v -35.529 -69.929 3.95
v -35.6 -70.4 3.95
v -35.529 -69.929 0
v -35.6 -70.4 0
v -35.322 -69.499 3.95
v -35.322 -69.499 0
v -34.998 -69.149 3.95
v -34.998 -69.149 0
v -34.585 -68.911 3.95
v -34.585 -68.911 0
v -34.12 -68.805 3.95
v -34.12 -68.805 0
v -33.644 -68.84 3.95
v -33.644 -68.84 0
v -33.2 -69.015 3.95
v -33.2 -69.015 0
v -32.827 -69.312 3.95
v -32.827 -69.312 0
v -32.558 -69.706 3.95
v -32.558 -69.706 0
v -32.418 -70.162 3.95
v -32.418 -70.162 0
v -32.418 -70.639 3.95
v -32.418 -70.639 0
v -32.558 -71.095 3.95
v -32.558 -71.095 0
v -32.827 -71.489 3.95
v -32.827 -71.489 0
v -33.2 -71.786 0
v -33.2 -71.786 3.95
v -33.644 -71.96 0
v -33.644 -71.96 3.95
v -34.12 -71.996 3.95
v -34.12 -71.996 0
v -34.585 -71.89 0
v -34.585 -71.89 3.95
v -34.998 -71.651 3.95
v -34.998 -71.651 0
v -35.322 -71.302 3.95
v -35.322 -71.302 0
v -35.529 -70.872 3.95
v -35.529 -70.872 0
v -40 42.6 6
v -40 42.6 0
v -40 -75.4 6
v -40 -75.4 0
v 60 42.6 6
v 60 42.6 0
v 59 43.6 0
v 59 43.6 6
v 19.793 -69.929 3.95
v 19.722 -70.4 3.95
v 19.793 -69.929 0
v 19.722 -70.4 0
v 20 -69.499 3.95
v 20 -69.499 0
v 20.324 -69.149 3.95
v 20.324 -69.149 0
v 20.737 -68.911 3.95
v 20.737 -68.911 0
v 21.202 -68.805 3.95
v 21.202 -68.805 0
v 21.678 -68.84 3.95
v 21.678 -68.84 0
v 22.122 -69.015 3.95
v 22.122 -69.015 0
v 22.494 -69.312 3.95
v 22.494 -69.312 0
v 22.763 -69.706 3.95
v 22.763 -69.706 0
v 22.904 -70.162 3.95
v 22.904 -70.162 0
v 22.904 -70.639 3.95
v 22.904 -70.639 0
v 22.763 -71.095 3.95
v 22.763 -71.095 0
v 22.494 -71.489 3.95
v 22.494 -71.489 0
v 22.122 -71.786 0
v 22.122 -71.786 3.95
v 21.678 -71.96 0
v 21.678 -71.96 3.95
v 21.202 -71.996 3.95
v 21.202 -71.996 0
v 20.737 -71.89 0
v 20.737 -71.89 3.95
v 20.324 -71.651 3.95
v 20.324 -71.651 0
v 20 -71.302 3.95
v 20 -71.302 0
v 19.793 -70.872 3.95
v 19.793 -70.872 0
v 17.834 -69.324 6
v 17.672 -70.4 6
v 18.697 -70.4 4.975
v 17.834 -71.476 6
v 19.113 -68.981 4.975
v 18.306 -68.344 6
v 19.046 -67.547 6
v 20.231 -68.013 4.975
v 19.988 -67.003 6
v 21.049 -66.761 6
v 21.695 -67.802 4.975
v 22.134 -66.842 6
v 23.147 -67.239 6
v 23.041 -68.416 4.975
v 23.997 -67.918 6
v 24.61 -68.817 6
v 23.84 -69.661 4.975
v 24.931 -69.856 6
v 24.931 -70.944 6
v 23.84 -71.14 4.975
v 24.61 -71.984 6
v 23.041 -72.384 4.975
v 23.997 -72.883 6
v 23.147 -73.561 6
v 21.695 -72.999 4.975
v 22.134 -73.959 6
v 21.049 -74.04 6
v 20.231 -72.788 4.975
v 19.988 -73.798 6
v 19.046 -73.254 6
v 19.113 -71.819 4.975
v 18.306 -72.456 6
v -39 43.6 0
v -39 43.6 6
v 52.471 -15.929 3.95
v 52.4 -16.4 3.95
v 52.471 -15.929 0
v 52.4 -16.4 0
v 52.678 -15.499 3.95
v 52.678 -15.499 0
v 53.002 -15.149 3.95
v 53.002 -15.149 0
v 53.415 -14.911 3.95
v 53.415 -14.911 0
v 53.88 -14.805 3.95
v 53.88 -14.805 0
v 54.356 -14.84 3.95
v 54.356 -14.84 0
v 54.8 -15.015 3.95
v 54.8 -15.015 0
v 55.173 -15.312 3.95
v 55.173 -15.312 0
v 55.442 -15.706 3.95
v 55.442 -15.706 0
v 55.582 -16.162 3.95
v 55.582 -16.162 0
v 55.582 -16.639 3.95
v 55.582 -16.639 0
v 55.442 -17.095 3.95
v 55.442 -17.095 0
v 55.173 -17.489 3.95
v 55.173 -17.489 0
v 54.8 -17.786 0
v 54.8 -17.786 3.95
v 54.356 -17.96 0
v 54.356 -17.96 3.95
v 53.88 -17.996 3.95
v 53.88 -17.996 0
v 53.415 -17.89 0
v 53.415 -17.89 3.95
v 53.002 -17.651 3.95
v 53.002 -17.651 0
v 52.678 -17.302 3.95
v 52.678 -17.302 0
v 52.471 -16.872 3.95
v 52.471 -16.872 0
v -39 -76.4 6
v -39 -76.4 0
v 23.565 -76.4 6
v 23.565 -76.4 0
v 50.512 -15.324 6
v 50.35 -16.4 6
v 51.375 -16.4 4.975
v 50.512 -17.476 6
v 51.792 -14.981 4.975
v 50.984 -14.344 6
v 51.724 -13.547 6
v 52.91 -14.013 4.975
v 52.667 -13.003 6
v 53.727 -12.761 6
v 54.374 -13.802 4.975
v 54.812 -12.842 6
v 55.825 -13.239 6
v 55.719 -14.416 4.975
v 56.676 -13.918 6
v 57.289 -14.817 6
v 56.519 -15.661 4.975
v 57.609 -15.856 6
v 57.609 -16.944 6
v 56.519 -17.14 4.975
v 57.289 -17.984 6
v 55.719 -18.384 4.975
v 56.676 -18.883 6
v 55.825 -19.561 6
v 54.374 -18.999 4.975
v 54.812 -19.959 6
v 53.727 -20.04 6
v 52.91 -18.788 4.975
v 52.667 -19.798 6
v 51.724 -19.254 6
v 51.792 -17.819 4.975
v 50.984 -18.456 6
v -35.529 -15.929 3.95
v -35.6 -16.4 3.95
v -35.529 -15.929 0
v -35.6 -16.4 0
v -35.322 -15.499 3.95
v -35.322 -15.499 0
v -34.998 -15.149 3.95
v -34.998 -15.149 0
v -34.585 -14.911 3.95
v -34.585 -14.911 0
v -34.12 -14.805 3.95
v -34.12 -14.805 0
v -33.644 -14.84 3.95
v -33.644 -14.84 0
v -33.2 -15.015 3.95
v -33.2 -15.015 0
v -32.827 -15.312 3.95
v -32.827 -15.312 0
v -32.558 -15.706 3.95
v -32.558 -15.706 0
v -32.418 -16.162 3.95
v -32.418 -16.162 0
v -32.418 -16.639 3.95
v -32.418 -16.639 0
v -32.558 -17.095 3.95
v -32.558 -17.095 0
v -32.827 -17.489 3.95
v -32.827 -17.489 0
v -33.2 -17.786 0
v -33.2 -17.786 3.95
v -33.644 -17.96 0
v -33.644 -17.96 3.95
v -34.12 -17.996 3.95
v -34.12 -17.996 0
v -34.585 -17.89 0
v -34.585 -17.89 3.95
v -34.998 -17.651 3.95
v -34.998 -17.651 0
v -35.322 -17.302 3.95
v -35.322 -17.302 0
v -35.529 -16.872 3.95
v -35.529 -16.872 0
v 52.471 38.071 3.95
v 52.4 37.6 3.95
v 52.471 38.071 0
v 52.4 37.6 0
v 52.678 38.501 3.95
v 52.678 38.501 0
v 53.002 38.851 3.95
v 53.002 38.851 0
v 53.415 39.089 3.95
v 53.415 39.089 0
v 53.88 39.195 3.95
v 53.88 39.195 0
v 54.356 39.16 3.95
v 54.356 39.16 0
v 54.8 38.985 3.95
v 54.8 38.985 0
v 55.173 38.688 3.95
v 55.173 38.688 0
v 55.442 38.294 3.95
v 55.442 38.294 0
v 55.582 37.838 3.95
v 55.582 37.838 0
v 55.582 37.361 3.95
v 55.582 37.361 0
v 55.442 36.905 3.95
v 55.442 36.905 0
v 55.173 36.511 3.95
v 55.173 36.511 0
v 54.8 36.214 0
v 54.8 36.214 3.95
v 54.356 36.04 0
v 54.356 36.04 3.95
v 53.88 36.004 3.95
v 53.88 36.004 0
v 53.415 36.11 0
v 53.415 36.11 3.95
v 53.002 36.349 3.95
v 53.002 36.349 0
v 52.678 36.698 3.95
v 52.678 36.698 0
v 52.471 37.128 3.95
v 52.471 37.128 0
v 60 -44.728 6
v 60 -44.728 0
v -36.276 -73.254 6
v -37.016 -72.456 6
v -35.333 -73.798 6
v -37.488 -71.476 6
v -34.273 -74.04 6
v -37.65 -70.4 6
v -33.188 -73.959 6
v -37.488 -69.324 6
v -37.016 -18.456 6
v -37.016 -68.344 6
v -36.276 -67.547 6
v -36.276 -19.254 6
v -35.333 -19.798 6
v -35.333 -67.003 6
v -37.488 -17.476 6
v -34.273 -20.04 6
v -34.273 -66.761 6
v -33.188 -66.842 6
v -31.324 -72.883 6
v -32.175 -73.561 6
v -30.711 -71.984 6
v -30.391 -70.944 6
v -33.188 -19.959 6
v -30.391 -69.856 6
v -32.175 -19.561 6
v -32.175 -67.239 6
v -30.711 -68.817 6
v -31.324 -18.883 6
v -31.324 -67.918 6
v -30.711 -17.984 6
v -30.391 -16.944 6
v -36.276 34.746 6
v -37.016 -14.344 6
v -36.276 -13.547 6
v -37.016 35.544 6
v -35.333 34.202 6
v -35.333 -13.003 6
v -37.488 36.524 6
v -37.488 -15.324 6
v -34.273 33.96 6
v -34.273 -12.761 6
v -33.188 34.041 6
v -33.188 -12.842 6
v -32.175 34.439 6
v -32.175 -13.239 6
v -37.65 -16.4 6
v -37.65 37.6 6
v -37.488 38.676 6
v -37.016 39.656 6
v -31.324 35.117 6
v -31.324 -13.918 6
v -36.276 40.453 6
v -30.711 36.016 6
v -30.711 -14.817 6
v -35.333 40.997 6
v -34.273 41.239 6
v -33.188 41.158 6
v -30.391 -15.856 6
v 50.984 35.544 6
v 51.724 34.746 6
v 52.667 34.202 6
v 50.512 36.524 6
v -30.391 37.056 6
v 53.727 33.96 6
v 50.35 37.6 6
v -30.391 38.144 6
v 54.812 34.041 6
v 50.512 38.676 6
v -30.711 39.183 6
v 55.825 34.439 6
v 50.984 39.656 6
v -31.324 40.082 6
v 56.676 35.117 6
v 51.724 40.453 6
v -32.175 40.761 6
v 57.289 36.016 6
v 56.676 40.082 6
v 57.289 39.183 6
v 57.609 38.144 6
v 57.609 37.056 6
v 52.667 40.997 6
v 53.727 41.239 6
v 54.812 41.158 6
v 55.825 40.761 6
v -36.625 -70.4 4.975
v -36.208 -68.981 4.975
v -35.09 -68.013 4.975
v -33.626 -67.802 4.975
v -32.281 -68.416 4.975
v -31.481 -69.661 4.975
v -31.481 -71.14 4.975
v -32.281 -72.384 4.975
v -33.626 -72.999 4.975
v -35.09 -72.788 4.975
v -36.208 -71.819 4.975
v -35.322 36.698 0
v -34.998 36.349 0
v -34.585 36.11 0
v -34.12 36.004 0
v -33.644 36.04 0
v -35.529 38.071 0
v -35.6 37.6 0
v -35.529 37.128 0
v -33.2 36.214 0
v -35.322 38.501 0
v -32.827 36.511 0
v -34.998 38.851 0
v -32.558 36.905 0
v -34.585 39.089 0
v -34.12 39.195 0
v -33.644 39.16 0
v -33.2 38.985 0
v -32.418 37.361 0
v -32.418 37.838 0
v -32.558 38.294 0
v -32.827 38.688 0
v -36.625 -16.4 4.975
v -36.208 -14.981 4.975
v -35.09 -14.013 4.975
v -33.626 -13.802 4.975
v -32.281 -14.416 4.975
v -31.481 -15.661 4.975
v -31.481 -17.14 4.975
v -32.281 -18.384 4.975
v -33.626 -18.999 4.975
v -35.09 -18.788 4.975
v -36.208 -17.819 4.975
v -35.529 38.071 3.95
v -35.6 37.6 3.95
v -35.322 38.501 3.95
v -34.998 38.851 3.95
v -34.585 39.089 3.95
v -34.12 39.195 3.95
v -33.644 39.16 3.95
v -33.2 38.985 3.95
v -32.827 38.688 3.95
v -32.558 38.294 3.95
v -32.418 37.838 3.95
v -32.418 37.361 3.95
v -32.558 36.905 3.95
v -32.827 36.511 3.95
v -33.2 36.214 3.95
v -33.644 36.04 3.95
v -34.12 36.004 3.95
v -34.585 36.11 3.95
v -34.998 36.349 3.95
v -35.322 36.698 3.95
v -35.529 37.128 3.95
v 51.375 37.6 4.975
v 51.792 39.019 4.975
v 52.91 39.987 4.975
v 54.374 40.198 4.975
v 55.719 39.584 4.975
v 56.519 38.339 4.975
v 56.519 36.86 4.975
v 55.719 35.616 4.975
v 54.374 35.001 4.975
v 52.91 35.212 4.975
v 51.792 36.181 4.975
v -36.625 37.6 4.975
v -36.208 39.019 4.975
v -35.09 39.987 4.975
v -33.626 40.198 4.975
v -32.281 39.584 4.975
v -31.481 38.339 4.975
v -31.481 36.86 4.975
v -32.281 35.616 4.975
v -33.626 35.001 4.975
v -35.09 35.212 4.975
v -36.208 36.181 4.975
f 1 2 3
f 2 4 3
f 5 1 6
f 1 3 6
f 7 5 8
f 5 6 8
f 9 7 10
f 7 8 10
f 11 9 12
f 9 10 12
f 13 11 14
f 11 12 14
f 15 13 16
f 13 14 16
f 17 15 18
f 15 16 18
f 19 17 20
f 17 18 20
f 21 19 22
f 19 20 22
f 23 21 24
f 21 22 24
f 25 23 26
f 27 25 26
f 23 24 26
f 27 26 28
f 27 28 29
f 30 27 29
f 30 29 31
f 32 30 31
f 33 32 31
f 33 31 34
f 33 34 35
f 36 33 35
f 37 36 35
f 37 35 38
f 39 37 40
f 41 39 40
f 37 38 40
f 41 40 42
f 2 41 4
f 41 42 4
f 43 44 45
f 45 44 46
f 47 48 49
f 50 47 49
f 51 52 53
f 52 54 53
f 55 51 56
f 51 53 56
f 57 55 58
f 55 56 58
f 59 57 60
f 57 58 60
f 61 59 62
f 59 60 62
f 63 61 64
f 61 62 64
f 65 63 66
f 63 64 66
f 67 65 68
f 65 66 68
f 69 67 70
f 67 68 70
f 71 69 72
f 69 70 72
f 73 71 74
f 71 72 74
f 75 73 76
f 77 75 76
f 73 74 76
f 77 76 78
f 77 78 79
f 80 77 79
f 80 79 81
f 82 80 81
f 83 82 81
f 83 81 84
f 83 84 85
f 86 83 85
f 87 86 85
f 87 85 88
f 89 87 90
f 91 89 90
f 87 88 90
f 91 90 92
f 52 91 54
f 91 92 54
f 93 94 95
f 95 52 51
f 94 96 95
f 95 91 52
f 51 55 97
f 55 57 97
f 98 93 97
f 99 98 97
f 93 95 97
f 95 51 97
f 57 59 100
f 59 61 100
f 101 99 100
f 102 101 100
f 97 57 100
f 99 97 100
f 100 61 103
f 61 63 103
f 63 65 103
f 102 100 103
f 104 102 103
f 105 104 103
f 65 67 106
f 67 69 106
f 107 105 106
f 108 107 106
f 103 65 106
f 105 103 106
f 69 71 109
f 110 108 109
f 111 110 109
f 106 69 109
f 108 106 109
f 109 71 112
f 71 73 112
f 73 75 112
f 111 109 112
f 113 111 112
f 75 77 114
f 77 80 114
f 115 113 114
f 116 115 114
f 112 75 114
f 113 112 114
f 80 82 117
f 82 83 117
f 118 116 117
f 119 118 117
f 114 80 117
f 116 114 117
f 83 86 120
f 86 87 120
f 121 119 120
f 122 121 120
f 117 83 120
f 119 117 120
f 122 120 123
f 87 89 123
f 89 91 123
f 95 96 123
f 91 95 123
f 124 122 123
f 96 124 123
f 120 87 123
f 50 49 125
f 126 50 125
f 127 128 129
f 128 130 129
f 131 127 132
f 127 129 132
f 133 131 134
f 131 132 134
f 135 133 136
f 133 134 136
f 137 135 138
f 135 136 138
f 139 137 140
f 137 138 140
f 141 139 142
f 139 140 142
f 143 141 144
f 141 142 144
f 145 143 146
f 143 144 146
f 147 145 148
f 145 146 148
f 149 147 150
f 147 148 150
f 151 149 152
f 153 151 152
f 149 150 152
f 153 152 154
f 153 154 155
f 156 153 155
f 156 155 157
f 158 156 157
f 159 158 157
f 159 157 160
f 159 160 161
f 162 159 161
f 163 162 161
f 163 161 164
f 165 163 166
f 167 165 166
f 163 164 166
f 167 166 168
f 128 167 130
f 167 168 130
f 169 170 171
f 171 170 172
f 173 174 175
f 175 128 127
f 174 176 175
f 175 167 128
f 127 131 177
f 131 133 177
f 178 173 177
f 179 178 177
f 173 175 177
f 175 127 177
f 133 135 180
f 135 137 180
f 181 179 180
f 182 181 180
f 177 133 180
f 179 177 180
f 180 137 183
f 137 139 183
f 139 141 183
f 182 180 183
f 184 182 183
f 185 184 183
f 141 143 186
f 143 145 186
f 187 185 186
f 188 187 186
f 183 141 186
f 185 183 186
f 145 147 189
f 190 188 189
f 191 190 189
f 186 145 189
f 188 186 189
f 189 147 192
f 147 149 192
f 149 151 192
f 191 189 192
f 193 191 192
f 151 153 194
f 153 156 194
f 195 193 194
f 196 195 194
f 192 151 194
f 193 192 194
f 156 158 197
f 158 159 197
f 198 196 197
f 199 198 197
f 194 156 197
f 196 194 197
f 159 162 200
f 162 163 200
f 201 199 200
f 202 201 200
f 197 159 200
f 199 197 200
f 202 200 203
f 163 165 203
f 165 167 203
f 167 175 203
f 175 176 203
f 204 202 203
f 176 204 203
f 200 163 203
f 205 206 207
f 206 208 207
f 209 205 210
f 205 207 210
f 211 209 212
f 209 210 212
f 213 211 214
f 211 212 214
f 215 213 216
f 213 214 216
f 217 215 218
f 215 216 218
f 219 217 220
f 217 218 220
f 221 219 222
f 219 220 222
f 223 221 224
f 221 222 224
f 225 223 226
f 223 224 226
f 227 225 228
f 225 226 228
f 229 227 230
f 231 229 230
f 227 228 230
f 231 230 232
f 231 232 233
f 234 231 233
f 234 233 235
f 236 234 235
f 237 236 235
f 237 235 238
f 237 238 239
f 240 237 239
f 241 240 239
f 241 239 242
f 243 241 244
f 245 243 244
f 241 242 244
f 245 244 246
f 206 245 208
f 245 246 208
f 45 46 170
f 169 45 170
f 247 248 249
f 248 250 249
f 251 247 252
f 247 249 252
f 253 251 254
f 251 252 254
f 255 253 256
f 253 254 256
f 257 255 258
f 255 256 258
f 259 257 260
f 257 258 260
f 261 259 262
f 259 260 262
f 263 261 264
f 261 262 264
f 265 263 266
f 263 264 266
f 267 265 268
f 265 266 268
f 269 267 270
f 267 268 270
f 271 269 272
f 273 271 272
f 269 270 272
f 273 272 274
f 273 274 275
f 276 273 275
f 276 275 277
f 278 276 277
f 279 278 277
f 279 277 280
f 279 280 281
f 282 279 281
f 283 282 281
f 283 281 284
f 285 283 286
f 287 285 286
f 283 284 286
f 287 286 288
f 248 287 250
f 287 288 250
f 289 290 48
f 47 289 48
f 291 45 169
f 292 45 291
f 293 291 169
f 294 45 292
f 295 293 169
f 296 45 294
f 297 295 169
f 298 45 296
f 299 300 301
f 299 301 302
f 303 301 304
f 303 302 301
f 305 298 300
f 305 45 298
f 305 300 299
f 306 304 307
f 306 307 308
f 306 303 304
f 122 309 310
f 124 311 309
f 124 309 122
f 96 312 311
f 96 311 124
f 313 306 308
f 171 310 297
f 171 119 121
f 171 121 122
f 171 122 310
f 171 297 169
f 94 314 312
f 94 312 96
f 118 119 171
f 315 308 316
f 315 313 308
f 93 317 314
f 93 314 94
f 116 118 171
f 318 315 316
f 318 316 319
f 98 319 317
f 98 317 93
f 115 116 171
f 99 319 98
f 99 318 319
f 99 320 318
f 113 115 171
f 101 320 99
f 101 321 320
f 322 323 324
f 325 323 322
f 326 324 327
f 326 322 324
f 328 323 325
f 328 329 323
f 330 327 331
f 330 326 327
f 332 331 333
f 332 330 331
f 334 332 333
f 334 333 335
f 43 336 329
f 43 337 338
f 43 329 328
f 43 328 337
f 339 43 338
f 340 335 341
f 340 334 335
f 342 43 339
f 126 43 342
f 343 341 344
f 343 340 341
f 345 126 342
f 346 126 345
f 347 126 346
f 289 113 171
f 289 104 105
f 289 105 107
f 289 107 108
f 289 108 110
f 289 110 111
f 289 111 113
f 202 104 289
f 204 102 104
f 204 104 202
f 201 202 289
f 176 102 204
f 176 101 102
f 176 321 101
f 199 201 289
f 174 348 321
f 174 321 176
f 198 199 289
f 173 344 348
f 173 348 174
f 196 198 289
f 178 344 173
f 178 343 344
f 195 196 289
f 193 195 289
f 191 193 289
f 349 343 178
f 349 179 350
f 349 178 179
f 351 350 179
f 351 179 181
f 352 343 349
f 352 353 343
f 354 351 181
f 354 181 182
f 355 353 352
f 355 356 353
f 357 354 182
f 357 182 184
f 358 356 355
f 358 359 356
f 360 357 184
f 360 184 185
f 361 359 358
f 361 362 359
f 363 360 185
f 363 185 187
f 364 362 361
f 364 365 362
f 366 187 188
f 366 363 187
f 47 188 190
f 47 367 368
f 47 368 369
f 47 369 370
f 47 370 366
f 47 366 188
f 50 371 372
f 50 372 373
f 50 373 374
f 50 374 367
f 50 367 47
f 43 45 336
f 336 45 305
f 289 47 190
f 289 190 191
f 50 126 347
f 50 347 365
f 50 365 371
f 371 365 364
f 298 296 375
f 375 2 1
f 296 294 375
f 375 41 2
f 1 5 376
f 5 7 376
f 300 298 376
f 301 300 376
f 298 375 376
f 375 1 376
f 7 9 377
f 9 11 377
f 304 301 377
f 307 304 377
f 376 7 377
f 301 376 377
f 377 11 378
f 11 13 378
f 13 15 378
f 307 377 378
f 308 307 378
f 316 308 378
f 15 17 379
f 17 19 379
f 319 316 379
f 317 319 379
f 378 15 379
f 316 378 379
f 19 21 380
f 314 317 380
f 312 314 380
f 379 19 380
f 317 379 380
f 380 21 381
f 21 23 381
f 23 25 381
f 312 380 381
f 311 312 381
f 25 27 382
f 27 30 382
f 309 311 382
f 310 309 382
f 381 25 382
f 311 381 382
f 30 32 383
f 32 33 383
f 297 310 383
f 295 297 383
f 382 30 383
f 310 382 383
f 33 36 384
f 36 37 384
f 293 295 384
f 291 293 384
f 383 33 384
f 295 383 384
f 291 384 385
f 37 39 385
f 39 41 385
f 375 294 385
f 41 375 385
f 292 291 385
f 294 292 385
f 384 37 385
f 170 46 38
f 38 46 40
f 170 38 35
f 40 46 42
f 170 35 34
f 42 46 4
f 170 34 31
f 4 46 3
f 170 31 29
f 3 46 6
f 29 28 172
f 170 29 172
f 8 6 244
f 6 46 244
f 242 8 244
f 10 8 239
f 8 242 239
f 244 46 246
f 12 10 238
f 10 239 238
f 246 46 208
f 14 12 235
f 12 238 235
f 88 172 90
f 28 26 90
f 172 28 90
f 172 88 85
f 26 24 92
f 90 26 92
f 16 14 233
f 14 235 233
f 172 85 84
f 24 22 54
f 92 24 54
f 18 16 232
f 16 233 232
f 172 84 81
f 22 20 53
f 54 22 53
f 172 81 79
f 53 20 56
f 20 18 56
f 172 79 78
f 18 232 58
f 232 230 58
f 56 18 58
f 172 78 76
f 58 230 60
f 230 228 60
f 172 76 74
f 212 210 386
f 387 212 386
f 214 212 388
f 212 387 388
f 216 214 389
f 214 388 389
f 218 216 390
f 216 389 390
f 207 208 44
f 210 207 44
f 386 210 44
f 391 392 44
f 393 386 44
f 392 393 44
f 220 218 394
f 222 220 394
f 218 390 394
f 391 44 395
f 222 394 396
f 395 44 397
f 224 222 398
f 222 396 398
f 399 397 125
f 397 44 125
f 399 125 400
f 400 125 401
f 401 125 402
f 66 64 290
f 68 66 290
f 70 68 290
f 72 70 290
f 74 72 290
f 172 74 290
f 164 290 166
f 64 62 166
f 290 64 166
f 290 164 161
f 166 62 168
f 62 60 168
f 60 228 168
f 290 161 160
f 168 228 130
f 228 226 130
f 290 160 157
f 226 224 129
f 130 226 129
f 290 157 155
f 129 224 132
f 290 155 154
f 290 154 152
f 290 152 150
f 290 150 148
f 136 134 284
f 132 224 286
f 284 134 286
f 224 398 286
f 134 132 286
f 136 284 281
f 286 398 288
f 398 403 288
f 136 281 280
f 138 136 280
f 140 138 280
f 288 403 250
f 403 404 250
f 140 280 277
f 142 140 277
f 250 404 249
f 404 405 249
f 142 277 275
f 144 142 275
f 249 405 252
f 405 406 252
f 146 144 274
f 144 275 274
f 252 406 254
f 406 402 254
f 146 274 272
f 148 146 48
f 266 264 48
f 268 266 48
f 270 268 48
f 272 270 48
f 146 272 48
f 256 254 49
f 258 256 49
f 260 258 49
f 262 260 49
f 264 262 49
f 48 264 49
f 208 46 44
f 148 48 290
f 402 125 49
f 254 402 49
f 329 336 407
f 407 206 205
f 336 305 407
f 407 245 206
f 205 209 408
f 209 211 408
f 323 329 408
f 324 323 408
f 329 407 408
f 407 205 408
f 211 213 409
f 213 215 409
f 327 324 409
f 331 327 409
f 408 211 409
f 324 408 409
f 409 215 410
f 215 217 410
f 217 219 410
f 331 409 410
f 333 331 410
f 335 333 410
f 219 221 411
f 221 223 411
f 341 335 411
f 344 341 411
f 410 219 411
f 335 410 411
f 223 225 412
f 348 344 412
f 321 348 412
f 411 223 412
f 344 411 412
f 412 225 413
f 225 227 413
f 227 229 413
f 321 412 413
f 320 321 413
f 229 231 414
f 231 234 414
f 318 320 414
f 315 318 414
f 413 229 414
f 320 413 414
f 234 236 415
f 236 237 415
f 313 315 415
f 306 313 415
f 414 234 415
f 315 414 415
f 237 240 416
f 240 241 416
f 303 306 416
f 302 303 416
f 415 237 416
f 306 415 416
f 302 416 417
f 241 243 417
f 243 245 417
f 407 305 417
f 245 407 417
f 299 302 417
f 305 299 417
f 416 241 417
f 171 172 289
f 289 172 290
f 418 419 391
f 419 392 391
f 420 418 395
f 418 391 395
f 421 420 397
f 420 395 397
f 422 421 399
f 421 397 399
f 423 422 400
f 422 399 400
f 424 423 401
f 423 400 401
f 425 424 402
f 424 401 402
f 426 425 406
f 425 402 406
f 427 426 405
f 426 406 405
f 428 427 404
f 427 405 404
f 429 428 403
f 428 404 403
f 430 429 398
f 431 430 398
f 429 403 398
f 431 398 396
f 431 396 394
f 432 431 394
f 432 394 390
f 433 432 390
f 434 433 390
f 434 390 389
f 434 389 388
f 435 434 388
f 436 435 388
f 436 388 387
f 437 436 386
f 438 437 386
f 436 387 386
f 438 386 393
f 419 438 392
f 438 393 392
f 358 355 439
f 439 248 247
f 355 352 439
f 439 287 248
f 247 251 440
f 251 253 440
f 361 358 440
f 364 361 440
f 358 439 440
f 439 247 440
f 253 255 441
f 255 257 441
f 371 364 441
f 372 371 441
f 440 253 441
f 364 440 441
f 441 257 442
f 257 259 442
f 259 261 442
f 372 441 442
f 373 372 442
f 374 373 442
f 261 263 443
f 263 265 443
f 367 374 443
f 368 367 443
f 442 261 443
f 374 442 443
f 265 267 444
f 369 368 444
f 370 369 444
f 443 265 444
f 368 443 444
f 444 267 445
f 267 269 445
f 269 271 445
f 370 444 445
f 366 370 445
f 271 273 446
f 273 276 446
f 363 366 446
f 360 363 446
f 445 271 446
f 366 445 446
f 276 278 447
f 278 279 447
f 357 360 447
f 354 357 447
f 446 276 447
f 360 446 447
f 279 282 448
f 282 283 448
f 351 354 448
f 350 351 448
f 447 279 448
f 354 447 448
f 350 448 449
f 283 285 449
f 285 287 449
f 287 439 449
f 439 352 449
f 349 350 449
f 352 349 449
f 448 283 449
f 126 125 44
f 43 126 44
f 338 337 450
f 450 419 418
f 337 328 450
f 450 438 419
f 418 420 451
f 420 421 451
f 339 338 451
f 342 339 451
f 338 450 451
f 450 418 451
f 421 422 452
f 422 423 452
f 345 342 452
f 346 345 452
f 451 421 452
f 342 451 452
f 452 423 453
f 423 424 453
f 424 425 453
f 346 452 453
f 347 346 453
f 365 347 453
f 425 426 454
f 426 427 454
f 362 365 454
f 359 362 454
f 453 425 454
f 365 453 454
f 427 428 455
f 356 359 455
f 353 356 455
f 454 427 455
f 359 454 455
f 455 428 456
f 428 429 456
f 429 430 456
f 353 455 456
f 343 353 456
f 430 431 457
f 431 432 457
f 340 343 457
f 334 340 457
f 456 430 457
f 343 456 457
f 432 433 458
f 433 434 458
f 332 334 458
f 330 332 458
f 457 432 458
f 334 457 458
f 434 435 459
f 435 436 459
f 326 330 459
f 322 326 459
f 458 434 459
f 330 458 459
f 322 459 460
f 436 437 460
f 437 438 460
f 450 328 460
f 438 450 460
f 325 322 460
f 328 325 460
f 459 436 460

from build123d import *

# Parameters (mm, degrees)
BOSS_EXTRUDE1_DEPTH                                 = 6
CSK_FOR_M3_COUNTERSUNK_FLAT_HEAD_SCREW1_D           = 3.2
CSK_FOR_M3_COUNTERSUNK_FLAT_HEAD_SCREW1_CSINK_D     = 7.3
CSK_FOR_M3_COUNTERSUNK_FLAT_HEAD_SCREW1_CSINK_ANGLE = 90


with BuildPart() as part:
    # Sketch1 → Boss-Extrude1 (new body)
    with BuildSketch(Plane.XY):
        Polygon((-40, 42.599696279), (-40, -75.400303721), (-39, -76.400303721), (23.564831516, -76.400303721), (60, -44.727694967), (60, 42.599696279), (59, 43.599696279), (-39, 43.599696279), align=None)
    extrude(amount=BOSS_EXTRUDE1_DEPTH)

    # CSK for M3 Countersunk Flat Head Screw1 (through all)
    with Locations(Plane(origin=(-34, 37.599696279, 6), x_dir=(1, 0, 0), z_dir=(0, 0, 1))):
        with Locations((0, 0), (88, 0), (88, -54), (0, -54), (0, -108), (55.321523439, -108)):
            CounterSinkHole(CSK_FOR_M3_COUNTERSUNK_FLAT_HEAD_SCREW1_D / 2, CSK_FOR_M3_COUNTERSUNK_FLAT_HEAD_SCREW1_CSINK_D / 2, counter_sink_angle=CSK_FOR_M3_COUNTERSUNK_FLAT_HEAD_SCREW1_CSINK_ANGLE)


solid = part.part
